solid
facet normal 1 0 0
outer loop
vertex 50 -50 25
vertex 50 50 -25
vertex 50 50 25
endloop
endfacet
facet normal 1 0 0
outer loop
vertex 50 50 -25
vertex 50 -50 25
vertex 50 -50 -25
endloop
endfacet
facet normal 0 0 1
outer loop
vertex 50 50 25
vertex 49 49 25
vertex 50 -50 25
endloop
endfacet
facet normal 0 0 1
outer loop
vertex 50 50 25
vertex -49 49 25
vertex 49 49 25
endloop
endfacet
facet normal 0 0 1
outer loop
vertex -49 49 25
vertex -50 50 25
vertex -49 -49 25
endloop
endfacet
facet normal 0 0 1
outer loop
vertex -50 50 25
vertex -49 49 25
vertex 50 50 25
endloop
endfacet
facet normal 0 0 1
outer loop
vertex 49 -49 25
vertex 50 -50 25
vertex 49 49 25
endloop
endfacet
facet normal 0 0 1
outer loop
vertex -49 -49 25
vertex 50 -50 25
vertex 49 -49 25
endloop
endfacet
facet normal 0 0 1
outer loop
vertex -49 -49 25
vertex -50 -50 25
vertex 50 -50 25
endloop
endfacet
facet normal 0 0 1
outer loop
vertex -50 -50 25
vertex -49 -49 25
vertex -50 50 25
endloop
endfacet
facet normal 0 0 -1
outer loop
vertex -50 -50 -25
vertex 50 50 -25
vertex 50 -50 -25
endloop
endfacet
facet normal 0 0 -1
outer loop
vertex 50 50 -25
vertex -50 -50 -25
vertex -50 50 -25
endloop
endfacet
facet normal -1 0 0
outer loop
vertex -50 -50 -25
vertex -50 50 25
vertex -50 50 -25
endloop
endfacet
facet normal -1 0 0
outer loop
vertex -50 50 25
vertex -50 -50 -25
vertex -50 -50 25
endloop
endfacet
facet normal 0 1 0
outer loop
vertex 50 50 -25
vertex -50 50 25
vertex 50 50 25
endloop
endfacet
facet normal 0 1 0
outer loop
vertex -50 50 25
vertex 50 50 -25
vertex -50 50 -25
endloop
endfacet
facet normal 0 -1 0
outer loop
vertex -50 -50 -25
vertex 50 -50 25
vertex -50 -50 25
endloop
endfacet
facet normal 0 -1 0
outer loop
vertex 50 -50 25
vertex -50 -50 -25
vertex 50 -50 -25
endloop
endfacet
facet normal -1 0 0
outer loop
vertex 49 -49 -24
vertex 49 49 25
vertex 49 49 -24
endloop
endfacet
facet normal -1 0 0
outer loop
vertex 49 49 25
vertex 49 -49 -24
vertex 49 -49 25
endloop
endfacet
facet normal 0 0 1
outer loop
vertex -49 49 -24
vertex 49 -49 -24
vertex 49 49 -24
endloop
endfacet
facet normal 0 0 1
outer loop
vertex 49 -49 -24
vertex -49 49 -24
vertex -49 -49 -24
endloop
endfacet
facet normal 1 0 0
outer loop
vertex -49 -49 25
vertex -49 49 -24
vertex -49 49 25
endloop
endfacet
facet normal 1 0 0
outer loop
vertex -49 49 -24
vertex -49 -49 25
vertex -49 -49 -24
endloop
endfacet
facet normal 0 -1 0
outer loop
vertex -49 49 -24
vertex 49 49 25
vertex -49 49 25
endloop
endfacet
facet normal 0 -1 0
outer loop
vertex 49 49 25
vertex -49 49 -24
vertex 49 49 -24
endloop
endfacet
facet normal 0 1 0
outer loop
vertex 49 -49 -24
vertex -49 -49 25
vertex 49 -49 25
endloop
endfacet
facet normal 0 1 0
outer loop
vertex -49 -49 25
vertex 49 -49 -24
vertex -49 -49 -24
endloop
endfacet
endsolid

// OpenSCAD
// file: parameters.scad
$width = 100;
$depth = 100;
$height = 50;

$margin = 2;

$connection = 5;

$hole_dia = 4;
// main file
include <parameters.scad>

module basin() {
  color("cyan") difference() {
    cube(size = [ $width, $depth, $height ], center = true);

    // DIFF
    translate([ 0, 0, $margin ])
        cube(size = [ $width - $margin, $depth - $margin, $height + $margin ],
             center = true);
  }
}
basin();
